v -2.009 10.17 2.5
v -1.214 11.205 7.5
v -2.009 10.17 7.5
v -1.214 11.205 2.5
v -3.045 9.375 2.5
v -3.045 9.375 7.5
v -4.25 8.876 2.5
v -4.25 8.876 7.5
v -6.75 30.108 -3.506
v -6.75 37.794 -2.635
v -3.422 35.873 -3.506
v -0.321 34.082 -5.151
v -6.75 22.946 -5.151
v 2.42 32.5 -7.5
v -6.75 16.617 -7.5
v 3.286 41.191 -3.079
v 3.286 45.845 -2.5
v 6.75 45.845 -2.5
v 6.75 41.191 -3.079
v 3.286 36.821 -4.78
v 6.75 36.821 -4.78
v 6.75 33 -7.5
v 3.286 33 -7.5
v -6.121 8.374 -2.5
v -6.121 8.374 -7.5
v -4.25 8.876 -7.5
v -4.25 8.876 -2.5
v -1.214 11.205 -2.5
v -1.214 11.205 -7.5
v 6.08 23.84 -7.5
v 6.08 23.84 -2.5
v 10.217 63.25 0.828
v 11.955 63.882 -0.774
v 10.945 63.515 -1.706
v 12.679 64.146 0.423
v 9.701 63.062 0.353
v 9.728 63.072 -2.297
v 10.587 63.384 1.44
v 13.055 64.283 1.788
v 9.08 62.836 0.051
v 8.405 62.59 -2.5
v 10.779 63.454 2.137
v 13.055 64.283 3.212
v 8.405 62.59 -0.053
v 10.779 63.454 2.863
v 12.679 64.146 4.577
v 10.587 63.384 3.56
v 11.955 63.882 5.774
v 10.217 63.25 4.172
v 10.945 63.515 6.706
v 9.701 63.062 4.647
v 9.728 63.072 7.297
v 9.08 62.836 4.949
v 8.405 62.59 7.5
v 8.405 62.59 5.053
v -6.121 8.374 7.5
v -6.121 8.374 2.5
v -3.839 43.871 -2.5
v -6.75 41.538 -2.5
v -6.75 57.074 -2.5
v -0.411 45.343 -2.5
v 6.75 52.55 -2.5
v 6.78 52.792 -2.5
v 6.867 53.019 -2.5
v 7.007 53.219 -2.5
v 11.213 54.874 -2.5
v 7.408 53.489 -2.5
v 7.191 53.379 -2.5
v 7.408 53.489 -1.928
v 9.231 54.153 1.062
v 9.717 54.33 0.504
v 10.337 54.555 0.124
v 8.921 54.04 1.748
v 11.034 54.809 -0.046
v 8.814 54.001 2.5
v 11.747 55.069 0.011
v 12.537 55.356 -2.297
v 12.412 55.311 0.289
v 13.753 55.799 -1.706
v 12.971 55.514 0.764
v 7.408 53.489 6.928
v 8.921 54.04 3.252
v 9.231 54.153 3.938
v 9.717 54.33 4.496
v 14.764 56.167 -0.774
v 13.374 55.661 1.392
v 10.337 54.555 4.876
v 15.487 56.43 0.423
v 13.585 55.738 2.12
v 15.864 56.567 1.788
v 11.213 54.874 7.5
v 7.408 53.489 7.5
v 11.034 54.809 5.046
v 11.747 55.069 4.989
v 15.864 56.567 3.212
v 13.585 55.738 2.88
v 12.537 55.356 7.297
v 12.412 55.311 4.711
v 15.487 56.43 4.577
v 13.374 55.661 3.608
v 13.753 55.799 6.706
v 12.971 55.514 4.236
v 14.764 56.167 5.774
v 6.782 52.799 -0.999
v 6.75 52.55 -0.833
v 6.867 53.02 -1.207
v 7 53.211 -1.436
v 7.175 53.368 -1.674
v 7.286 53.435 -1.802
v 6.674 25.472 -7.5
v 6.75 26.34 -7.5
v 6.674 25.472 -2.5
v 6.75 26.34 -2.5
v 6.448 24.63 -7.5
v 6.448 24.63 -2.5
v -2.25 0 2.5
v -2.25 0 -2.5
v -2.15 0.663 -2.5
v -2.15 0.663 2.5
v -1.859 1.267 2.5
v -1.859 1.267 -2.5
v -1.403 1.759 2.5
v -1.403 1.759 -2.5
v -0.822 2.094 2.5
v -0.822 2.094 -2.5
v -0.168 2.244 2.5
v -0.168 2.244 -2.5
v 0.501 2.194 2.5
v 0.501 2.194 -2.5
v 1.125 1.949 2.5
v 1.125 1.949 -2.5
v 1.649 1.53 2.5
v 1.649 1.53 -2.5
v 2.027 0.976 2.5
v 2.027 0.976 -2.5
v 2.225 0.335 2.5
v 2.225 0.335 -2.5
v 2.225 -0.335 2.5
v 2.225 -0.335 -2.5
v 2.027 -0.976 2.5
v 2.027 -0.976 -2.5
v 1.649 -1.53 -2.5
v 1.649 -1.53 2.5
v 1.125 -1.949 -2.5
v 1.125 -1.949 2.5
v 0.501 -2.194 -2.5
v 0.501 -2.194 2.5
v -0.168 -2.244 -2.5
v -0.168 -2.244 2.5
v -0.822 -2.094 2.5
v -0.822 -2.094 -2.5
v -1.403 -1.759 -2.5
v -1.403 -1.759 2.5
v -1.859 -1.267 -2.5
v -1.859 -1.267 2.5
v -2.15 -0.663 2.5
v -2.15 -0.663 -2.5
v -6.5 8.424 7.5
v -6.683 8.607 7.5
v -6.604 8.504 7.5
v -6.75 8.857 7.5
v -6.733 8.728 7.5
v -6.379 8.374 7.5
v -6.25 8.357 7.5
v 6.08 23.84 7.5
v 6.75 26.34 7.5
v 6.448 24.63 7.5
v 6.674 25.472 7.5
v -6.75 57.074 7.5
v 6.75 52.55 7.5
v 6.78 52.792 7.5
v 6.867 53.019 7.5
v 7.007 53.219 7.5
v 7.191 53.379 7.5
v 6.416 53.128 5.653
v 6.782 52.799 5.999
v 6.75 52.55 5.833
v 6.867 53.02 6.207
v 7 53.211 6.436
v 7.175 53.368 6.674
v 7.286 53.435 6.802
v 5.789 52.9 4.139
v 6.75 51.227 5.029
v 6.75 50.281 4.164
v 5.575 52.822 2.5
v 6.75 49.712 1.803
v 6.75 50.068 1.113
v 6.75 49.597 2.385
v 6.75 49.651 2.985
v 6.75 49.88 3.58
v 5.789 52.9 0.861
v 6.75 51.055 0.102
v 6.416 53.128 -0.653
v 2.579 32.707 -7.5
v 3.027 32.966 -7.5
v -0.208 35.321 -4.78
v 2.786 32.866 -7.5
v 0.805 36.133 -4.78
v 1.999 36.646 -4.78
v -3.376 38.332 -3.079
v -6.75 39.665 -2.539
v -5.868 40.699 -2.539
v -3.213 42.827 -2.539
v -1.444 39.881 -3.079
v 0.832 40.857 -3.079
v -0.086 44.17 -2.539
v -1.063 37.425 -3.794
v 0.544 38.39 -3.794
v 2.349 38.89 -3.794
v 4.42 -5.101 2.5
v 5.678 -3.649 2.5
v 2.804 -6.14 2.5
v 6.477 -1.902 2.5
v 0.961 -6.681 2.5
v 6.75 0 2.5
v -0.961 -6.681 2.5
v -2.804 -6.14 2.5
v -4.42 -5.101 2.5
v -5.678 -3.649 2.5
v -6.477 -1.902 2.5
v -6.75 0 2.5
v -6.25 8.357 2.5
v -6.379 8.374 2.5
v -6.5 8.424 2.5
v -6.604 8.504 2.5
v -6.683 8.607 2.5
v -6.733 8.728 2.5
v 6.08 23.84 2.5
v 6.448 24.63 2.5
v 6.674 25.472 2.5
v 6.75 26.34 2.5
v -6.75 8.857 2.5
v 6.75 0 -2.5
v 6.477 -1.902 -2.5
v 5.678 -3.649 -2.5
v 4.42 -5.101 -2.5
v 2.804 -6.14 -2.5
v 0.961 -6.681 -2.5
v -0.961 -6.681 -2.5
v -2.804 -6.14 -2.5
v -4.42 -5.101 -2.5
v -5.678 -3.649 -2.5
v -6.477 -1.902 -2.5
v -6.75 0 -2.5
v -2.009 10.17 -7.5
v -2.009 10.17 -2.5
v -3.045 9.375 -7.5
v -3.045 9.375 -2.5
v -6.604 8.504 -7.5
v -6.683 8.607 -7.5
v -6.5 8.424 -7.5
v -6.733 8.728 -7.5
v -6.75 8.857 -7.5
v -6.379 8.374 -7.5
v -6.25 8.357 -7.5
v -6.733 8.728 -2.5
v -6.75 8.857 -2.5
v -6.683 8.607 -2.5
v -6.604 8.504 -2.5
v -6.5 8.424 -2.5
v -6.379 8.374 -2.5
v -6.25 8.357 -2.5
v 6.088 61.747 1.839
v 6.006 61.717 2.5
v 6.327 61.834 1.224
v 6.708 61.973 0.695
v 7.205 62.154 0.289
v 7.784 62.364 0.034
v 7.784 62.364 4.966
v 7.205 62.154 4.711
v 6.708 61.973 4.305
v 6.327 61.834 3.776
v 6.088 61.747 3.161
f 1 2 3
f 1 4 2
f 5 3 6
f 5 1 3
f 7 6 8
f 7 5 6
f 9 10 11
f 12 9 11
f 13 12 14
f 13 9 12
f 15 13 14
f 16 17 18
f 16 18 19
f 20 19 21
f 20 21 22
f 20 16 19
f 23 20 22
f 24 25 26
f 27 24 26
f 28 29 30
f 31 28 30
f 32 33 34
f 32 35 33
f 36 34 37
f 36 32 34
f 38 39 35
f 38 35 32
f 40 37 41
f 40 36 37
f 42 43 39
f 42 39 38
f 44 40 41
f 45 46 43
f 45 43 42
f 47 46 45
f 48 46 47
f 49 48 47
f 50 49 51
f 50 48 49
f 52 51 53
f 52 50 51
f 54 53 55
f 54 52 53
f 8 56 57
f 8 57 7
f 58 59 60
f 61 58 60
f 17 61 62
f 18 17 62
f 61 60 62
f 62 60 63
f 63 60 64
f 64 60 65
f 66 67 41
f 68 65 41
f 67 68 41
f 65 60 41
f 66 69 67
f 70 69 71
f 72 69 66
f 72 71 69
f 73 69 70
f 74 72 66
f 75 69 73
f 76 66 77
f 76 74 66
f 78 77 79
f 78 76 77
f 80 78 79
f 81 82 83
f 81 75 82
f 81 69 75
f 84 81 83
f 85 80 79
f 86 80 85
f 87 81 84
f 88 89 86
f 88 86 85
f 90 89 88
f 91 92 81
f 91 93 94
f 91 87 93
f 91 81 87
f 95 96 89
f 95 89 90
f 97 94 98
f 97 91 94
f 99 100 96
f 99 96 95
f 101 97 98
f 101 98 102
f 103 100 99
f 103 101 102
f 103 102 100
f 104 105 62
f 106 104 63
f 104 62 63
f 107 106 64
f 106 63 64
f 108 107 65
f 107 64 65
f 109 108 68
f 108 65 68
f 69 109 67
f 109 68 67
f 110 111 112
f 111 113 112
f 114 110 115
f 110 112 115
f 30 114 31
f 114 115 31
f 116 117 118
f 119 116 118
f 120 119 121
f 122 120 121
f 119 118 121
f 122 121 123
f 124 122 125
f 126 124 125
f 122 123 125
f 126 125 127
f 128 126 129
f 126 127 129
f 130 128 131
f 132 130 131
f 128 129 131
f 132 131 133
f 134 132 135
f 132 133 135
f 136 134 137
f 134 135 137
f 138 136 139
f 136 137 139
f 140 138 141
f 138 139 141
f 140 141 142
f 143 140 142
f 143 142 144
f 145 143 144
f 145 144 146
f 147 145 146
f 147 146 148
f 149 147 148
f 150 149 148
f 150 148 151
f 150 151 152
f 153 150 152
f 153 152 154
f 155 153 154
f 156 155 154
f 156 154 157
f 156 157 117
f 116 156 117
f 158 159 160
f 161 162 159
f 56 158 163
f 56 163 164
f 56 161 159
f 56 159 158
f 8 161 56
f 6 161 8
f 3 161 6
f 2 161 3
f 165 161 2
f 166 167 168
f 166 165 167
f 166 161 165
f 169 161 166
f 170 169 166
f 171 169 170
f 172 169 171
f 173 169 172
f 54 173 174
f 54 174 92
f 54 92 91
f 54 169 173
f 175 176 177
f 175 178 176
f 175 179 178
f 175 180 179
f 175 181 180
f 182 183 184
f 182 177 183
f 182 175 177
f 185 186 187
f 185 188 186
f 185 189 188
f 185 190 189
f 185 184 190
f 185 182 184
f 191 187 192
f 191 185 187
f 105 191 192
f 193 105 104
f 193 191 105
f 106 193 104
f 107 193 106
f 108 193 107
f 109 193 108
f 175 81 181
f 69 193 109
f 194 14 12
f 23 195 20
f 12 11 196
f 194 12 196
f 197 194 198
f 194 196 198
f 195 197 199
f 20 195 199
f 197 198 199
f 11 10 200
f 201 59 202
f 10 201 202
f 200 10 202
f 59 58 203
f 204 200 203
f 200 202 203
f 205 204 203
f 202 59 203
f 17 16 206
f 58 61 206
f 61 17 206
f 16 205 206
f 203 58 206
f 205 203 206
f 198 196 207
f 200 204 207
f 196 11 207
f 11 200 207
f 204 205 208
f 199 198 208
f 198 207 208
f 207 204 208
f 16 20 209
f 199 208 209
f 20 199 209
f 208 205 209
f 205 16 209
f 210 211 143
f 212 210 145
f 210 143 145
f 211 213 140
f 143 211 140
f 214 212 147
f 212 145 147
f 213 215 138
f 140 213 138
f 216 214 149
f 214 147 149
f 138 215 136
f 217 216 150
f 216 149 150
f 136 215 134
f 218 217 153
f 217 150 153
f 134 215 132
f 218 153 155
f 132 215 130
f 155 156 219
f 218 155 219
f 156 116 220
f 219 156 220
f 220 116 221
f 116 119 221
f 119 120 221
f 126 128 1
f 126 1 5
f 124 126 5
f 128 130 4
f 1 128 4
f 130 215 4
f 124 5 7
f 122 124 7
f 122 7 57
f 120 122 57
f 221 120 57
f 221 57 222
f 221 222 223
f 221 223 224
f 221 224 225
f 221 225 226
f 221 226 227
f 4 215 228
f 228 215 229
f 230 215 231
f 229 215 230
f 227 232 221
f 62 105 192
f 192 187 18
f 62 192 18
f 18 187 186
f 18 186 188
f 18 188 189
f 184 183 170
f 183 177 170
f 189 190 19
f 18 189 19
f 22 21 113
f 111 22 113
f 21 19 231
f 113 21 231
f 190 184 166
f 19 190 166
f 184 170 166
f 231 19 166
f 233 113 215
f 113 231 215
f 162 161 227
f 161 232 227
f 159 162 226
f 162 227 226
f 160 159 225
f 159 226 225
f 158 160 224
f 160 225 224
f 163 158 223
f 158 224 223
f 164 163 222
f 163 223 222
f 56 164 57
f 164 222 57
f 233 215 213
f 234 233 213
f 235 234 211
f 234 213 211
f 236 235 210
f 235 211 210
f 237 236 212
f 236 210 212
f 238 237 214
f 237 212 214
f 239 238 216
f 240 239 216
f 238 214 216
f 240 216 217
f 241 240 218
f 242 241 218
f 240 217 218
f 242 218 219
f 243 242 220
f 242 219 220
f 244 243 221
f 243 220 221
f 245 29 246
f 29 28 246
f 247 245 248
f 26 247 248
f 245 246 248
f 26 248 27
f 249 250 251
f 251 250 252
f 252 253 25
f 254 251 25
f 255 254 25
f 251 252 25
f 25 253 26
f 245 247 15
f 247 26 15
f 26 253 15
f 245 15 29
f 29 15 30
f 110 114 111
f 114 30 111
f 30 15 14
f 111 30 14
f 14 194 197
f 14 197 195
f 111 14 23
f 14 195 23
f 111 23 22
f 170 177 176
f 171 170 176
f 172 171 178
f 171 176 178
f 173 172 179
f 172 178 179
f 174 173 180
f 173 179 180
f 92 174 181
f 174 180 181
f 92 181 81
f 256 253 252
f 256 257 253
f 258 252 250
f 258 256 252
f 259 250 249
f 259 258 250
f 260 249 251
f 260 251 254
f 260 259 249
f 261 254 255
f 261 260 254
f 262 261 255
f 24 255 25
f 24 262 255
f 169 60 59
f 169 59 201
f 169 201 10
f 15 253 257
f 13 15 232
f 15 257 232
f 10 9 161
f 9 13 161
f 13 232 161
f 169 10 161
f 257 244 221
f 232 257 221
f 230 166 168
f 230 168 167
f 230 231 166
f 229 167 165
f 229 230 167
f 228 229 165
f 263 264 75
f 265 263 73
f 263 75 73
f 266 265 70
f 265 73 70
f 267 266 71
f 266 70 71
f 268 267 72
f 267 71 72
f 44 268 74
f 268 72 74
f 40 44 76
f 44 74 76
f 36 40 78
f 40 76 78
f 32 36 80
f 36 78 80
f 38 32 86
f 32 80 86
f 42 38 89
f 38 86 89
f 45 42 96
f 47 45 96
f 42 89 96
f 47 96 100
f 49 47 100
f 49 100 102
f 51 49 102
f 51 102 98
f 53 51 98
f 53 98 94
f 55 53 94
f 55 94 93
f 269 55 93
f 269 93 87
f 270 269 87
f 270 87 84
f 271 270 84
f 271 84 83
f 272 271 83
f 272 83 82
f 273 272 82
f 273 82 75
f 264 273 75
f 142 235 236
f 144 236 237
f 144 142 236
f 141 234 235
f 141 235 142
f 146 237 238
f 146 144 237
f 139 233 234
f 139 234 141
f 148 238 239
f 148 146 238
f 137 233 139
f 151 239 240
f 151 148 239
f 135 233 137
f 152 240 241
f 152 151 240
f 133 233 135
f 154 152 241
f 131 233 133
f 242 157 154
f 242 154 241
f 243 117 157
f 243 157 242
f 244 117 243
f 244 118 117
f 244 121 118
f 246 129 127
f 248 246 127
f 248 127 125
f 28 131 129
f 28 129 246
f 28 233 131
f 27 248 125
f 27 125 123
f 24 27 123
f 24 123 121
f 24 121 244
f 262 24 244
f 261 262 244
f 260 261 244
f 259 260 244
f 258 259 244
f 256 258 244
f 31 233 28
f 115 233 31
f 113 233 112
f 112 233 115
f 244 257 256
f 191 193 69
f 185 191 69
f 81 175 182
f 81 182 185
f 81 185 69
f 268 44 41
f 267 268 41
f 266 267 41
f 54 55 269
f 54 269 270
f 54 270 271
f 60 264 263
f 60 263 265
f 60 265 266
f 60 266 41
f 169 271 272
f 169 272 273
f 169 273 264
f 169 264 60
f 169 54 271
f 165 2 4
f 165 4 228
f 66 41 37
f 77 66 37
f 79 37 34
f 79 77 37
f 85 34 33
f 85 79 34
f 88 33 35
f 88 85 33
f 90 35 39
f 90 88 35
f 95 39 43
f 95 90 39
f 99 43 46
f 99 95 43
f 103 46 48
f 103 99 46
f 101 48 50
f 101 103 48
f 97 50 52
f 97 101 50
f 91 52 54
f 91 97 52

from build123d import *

# Parameters (mm, degrees)
BOSS_EXTRUDE1_DEPTH    = 7.5
CUT_EXTRUDE1_DEPTH     = 5
M4_CLEARANCE_HOLE1_D   = 4.5
BOSS_EXTRUDE2_DEPTH    = 15
CUT_EXTRUDE5_START     = -15
CUT_EXTRUDE5_DEPTH     = 5
FILLET8_R              = 1
FILLET4_R              = 19
FILLET1_R              = 0.5
FILLET7_R              = 5
FILLET6_RADIUS         = 5
FILLET6_LENGTH         = 8.210867904
F_10_CLEARANCE_HOLE1_D = 5.1054
FILLET9_R              = 5
FILLET10_R             = 1
SKETCH15_R             = 6
CUT_EXTRUDE7_DEPTH     = 16


with BuildPart() as part:
    # Sketch1 → Boss-Extrude1 (new, symmetric)
    with BuildSketch(Plane.XY):
        with BuildLine():
            Line((-6.749999988, 53.250000012), (6.749999988, 53.250000012))
            Line((6.749999988, 53.250000012), (6.749999988, 0))
            ThreePointArc((6.749999988, 0), (0, -6.749999988), (-6.749999988, 0))
            Line((-6.749999988, 0), (-6.749999988, 53.250000012))
        make_face()
    extrude(amount=BOSS_EXTRUDE1_DEPTH, both=True)

    # Sketch3 → Cut-Extrude1 (cut)
    with BuildSketch(Plane.XY.offset(7.5)):
        with BuildLine():
            Line((-6.749999988, 0), (-6.749999988, 8.205771407))
            Line((-6.749999988, 8.205771407), (-2.249999988, 9.411542773))
            Line((-2.249999988, 9.411542773), (6.749999988, 25))
            Line((6.749999988, 25), (6.749999988, 0))
            ThreePointArc((6.749999988, 0), (0, -6.749999988), (-6.749999988, 0))
        make_face()
    cut_extrude1 = extrude(amount=-CUT_EXTRUDE1_DEPTH, mode=Mode.SUBTRACT)

    # M4 Clearance Hole1 (through all)
    with Locations(Plane.XY.offset(2.5)):
        with Locations((0, 0)):
            Hole(M4_CLEARANCE_HOLE1_D / 2)

    # Mirror1: Cut-Extrude1 across plane
    add(cut_extrude1.mirror(Plane.XY), mode=Mode.SUBTRACT)

    # Sketch8 → Boss-Extrude2 (add)
    with BuildSketch(Plane.XY.offset(7.5)):
        Polygon((13.103097639, 64.300161569), (8.404634535, 62.590060852), (-6.749999988, 57.074224974), (-6.749999988, 53.250000012), (6.749999988, 53.250000012), (15.911379857, 56.584469589), align=None)
    extrude(amount=-BOSS_EXTRUDE2_DEPTH)

    # Sketch9 → Cut-Extrude5 (cut)
    with BuildSketch(Plane.XY.offset(7.5).offset(CUT_EXTRUDE5_START)):
        Polygon((-6.749999988, 16.617314139), (2.708548104, 33), (6.749999988, 33), (6.749999988, 53.250000012), (15.911379857, 56.584469589), (13.103097639, 64.300161569), (-6.749999988, 57.074224974), align=None)
    extrude(amount=CUT_EXTRUDE5_DEPTH, mode=Mode.SUBTRACT)

    # Fillet8
    fillet8_edges = [part.edges().sort_by_distance(p)[0] for p in [
        (2.708548104, 33, -5),
    ]]
    fillet(fillet8_edges, radius=FILLET8_R)

    # Fillet4
    # the kernel refuses this fillet: 19 mm, written as the material it adds along each edge
    with BuildSketch(Plane(origin=(3.285898373, 33, -2.5), x_dir=(0, 1, 0), z_dir=(1, 0, 0))) as fillet4_piece_1:
        with BuildLine():
            CenterArc((12.845232579, -19), FILLET4_R, 90, 42.536898363)
            Line((0, -5), (0, 0))
            Line((0, 0), (12.845232579, 0))
        make_face()
    extrude(amount=3.464101615)
    with BuildSketch(Plane(origin=(-22.806540711, -11.193430188, -2.5), x_dir=(-0.8660254037844388, 0.4999999999999999, 0), z_dir=(0.4999999999999999, 0.8660254037844388, 0))) as fillet4_piece_2_section:
        with BuildLine():
            CenterArc((12.845232579, -19), FILLET4_R, 90, 42.536898363)
            Line((0, -5), (0, 0))
            Line((0, 0), (12.845232579, 0))
        make_face()
    fillet4_piece_2 = extrude(amount=50.452827361, mode=Mode.PRIVATE)
    fillet4_piece_2 = split(fillet4_piece_2, bisect_by=Plane(origin=(-6.749999988, -11.193430188, -2.5), z_dir=(1, 0, 0)), keep=Keep.TOP, mode=Mode.PRIVATE)
    add(fillet4_piece_2)
    with BuildSketch(Plane(origin=(3.285898373, 32, -2.5), x_dir=(-0.8660254037844386, 0.4999999999999999, 0), z_dir=(-0.4999999999999999, -0.8660254037844386, 0))) as fillet4_piece_3_section:
        with BuildLine():
            CenterArc((13.845232579, 19), FILLET4_R, 227.463101637, 42.536898363)
            Line((1, 5), (1, 0))
            Line((1, 0), (13.845232579, 0))
        make_face()
    fillet4_piece_3 = revolve(axis=Axis((3.285898373, 32, -2.5), (0, 0, -1)), revolution_arc=60, mode=Mode.PRIVATE)
    fillet4_piece_3 = split(fillet4_piece_3, bisect_by=Plane(origin=(-6.749999988, 32, -2.5), z_dir=(1, 0, 0)), keep=Keep.TOP, mode=Mode.PRIVATE)
    add(fillet4_piece_3)

    # Fillet1
    fillet1_edges = [part.edges().sort_by_distance(p)[0] for p in [
        (-6.749999988, 8.205771407, 5),
        (-6.749999988, 8.205771407, -5),
    ]]
    fillet(fillet1_edges, radius=FILLET1_R)

    # Fillet7
    fillet7_edges = [part.edges().sort_by_distance(p)[0] for p in [
        (6.749999988, 25, 5),
        (6.749999988, 25, -5),
    ]]
    fillet(fillet7_edges, radius=FILLET7_R)

    # Fillet6: full round fillet: the end face becomes a half cylinder, R = half its width
    fillet6_face = Plane((14.507238748, 60.442315579, 2.5), x_dir=(0.342020143326, -0.939692620786, 0), z_dir=(0.939692620786, 0.342020143326, 0))  # on the end face: x along it, z out of the body
    fillet6_slab = fillet6_face.offset(-FILLET6_RADIUS / 2) * Box(FILLET6_LENGTH, 2 * FILLET6_RADIUS, FILLET6_RADIUS, mode=Mode.PRIVATE)  # the body's end, R deep
    fillet6_round = Plane((9.808775644, 58.732214862, 2.5), x_dir=(0.939692620786, 0.342020143326, 0), z_dir=(0.342020143326, -0.939692620786, 0)) * Cylinder(FILLET6_RADIUS, FILLET6_LENGTH, mode=Mode.PRIVATE)  # its axis R under the face
    add(fillet6_slab - fillet6_round, mode=Mode.SUBTRACT)

    # #10 Clearance Hole1 (through all)
    with Locations(Plane(origin=(-19.132902326, 52.56721711, 0), x_dir=(0.9396926207859103, 0.3420201433256639, 0), z_dir=(-0.3420201433256639, 0.9396926207859103, 0))):
        with Locations((29.304834637, -2.5)):
            Hole(F_10_CLEARANCE_HOLE1_D / 2)

    # Fillet9
    fillet9_edges = [part.edges().sort_by_distance(p)[0] for p in [
        (-2.249999988, 9.411542773, 5),
        (-2.249999988, 9.411542773, -5),
    ]]
    fillet(fillet9_edges, radius=FILLET9_R)

    # Fillet10
    fillet10_edges = [part.edges().sort_by_distance(p)[0] for p in [
        (6.749999988, 53.250000012, 2.5),
    ]]
    fillet(fillet10_edges, radius=FILLET10_R)

    # Sketch15 → Cut-Extrude7 (cut)
    with BuildSketch(Plane(origin=(-16.324620109, 44.85152513, 0), x_dir=(0.9396926207859103, 0.3420201433256634, 0), z_dir=(0.3420201433256634, -0.9396926207859103, 0))):
        with Locations((29.304834637, 2.5)):
            Circle(SKETCH15_R)
    extrude(amount=CUT_EXTRUDE7_DEPTH, mode=Mode.SUBTRACT)


solid = part.part
